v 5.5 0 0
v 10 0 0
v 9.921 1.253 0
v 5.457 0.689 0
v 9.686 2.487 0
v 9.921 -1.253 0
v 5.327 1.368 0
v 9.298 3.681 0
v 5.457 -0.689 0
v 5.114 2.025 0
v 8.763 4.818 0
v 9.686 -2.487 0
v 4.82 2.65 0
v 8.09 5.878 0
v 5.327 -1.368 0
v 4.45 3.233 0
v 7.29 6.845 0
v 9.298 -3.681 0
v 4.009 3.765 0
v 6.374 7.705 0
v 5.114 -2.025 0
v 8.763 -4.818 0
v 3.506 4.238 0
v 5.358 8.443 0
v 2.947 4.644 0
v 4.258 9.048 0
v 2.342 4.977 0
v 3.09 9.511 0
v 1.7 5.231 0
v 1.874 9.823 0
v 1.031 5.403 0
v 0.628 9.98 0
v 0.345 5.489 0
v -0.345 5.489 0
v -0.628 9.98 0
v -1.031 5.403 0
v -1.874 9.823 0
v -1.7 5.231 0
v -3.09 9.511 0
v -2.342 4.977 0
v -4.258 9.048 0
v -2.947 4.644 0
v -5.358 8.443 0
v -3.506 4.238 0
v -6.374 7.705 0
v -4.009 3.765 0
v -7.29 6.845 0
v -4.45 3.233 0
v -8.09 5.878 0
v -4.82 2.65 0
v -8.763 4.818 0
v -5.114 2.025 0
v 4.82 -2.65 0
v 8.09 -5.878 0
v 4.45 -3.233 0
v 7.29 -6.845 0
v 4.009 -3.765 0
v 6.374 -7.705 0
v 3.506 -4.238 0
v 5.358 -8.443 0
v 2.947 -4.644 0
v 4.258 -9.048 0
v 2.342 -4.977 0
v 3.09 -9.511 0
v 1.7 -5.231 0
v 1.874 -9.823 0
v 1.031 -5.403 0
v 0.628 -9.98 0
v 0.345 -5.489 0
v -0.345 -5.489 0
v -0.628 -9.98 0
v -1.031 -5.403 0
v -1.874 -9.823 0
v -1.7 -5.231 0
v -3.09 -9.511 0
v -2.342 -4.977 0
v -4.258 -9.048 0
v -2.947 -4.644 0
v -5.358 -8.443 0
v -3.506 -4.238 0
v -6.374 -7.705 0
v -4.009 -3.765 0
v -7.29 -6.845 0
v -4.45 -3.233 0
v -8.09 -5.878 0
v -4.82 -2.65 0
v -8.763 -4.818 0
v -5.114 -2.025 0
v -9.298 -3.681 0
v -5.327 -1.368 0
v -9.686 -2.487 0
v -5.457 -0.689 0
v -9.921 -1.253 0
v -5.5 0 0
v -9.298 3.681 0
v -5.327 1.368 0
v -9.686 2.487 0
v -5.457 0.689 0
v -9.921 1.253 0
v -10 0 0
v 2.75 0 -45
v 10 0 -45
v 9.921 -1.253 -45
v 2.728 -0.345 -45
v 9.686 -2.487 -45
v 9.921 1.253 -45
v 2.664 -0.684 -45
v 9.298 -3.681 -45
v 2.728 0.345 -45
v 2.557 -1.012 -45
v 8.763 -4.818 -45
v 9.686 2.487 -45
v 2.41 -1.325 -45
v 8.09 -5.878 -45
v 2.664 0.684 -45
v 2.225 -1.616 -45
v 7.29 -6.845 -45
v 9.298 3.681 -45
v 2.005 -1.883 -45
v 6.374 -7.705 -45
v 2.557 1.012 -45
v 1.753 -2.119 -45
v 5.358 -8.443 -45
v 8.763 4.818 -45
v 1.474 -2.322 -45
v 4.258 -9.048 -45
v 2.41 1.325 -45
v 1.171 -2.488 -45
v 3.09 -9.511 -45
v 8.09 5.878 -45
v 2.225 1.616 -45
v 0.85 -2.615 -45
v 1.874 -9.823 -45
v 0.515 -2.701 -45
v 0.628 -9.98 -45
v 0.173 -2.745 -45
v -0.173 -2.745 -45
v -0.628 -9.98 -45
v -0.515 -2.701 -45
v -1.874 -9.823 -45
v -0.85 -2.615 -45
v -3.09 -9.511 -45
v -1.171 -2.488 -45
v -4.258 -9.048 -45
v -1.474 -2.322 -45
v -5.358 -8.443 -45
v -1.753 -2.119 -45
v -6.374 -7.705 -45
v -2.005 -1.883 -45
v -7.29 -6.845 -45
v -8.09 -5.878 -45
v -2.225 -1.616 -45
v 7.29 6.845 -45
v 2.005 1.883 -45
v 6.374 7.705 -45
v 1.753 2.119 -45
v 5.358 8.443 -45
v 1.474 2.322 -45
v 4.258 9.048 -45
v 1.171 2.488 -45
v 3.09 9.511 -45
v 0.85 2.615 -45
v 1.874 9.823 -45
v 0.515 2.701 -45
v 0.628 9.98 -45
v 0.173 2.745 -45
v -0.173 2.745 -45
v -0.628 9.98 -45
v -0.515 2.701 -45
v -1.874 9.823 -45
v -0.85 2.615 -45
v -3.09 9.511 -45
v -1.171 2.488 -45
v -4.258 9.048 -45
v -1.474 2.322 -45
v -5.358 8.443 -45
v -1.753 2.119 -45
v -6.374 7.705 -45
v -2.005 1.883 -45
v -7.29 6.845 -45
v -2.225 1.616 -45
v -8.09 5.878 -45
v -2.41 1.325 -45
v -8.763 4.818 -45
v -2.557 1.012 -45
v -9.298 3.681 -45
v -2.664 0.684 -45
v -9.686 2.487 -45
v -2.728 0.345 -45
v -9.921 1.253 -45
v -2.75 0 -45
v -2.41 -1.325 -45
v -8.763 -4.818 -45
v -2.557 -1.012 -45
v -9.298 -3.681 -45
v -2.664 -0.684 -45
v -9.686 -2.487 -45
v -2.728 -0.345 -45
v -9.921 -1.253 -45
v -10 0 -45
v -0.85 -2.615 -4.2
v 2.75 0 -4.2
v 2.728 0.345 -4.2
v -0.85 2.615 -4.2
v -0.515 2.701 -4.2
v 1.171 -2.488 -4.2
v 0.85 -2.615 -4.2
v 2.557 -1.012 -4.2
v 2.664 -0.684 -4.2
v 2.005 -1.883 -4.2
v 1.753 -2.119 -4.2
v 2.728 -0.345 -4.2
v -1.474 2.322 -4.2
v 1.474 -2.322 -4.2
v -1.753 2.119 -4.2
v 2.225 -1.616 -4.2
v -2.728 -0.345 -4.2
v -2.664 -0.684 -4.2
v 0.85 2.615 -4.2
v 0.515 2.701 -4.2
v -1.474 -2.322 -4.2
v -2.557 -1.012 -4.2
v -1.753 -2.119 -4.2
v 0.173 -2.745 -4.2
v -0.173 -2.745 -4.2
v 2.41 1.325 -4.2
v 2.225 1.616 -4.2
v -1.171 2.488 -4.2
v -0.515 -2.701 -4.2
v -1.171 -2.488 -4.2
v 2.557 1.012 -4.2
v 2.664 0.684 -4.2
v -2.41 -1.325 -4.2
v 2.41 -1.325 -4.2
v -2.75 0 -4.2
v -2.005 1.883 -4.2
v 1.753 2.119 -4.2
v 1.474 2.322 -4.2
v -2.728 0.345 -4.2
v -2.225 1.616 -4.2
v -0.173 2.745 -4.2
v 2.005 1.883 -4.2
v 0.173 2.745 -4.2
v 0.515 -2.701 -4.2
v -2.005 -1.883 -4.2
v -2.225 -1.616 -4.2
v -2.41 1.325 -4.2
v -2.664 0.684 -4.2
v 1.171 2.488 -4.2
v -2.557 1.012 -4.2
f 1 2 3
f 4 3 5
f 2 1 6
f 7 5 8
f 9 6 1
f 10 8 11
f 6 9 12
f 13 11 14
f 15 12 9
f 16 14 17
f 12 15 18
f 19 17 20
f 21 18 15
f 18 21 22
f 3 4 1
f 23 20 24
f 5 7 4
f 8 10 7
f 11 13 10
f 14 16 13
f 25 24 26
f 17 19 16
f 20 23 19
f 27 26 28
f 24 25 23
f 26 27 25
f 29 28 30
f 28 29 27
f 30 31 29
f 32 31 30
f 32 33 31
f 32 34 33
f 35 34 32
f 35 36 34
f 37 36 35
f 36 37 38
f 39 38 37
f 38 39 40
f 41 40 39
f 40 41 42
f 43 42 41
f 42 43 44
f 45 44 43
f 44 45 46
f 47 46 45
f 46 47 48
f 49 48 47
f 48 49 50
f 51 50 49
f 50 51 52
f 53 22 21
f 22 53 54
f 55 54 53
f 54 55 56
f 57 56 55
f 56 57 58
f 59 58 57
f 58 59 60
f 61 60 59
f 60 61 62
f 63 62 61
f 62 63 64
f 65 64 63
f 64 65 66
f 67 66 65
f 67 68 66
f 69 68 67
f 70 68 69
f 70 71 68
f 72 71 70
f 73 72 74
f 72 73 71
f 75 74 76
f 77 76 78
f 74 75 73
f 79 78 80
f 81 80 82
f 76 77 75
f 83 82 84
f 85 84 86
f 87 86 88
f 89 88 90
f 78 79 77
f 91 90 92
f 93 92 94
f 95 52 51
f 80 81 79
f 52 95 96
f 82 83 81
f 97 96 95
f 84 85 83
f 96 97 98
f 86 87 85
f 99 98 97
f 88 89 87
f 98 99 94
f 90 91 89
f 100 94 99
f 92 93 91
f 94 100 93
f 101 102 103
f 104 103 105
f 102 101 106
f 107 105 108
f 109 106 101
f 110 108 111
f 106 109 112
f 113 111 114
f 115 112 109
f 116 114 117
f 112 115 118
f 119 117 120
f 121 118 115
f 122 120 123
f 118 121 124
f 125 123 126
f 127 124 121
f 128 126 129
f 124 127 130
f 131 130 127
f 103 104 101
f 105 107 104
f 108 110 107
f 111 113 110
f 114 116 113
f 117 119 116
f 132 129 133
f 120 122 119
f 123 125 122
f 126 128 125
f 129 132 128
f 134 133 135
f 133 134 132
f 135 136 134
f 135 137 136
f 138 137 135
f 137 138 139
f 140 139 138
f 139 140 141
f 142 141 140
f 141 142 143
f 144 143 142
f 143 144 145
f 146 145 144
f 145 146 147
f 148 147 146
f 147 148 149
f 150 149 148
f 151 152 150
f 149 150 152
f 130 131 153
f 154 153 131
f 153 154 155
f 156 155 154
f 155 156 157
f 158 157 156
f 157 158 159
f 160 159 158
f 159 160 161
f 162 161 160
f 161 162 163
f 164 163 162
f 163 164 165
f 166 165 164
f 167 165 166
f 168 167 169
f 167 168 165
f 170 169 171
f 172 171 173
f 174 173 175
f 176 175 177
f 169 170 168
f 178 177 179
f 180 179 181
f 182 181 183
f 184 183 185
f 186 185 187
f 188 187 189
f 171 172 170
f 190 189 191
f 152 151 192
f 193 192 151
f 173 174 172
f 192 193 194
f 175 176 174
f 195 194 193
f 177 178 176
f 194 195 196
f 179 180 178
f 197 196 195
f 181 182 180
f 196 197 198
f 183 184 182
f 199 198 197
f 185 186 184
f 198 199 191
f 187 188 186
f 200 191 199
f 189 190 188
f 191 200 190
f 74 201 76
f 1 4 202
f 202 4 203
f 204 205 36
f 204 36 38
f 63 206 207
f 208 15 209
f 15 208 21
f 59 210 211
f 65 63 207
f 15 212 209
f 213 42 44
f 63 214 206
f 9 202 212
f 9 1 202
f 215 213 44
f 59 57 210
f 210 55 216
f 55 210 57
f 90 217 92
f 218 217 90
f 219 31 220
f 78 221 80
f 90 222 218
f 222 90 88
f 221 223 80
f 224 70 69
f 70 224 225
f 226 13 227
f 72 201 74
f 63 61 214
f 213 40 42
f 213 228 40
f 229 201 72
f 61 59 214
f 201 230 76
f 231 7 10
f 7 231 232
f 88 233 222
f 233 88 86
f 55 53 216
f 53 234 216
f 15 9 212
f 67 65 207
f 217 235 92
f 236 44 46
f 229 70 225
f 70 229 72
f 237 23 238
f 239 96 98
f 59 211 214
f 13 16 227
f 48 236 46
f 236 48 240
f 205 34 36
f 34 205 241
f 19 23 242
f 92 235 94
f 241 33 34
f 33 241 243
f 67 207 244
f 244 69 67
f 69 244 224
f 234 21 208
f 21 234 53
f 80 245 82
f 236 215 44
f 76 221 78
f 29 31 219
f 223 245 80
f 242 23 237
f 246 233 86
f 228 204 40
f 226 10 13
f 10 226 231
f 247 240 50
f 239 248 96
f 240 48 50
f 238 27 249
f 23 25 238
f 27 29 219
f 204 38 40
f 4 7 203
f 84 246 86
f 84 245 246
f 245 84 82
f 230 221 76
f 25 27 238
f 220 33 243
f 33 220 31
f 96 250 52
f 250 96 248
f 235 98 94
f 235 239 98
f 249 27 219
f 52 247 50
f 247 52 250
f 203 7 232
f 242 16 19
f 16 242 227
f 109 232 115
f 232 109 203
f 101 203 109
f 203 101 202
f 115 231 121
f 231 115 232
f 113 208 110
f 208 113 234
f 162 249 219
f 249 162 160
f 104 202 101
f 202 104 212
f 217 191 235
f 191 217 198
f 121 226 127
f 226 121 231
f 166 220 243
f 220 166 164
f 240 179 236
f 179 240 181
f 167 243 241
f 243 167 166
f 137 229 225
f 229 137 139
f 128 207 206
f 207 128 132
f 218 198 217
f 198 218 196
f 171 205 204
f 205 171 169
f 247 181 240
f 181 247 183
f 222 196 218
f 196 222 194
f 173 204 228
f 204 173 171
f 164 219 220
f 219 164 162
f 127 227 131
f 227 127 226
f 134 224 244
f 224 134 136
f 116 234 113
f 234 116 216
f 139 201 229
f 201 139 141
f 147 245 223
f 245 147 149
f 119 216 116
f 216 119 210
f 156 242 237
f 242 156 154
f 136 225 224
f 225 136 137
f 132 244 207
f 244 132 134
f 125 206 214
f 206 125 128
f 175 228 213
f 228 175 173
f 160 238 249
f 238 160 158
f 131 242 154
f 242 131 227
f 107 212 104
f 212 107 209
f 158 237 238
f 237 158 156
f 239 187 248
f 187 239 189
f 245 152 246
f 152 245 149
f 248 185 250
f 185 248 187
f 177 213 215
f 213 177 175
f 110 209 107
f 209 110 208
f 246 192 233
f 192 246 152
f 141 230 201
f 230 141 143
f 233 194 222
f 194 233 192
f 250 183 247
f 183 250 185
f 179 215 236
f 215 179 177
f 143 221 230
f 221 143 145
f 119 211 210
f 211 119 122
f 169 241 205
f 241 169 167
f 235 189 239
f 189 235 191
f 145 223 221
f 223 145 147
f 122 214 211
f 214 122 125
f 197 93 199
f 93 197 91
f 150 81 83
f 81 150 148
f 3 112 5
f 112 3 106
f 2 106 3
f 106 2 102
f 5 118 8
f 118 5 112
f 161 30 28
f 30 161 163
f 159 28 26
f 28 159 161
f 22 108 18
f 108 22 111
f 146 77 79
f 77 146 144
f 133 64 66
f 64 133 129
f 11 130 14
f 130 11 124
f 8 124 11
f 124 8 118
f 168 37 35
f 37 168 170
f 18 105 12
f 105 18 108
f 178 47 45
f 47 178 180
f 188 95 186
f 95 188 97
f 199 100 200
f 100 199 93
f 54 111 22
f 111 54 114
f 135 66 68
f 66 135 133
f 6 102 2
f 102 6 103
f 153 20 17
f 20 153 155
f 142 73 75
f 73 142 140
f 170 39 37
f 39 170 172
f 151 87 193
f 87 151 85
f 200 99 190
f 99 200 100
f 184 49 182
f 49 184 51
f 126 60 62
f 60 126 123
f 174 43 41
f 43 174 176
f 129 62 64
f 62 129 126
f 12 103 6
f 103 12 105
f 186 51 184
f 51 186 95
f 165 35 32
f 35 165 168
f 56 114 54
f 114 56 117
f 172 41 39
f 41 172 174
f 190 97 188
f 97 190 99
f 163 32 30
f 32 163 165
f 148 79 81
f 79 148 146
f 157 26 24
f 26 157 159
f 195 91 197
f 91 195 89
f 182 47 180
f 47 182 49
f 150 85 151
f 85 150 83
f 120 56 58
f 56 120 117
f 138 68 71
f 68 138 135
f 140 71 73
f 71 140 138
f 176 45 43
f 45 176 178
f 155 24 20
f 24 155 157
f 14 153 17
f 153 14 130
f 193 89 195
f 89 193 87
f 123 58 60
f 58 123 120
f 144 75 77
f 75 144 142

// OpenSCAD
$fn = 50;


difference() {
	union() {
		translate(v = [0, 0, -45.0000000000]) {
			cylinder(h = 45, r = 10.0000000000);
		}
		cylinder(h = 0, r = 16.0000000000);
	}
	union() {
		translate(v = [0, 0, 0]) {
			rotate(a = [0, 0, 0]) {
				difference() {
					union() {
						#translate(v = [0, 0, -45.0000000000]) {
							cylinder(h = 45, r = 2.2500000000);
						}
						#translate(v = [0, 0, -4.2000000000]) {
							cylinder(h = 4.2000000000, r = 10.0000000000, r1 = 2.7500000000, r2 = 5.5000000000);
						}
						#translate(v = [0, 0, -45.0000000000]) {
							cylinder(h = 45, r = 2.7500000000);
						}
						#translate(v = [0, 0, -45.0000000000]) {
							cylinder(h = 45, r = 2.2500000000);
						}
					}
					union();
				}
			}
		}
	}
}
